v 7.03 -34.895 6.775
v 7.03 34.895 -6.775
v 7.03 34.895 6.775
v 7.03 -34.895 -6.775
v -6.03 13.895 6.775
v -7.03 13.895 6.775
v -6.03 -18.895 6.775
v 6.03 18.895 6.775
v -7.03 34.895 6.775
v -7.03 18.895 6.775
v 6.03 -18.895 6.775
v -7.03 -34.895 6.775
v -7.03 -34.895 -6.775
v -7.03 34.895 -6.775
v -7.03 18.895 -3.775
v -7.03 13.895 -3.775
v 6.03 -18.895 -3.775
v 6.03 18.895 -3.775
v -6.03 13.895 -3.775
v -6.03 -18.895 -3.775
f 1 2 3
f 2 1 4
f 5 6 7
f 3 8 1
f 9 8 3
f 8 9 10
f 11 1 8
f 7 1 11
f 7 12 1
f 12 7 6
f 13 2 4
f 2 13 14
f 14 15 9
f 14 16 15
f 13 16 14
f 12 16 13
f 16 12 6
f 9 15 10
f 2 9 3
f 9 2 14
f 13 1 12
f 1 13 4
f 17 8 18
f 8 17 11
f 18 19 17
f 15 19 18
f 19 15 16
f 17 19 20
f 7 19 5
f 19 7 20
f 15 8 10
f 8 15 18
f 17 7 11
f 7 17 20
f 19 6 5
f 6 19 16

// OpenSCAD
$fn = 100;

wHaptuator = 11.96 + 0.1;
dHaptuator = 37.69 + 0.1;
hHaptuator = 11.45 + 0.1;

dHole = 5;

thickness = 2;

module haptuatorBox() {
   color("DimGray")
   difference(){
   cube([wHaptuator + thickness, dHaptuator + thickness + 30, hHaptuator + thickness], center = true);
   
   //Cavity
   translate([0, 0 , thickness]){
   cube([wHaptuator, dHaptuator, hHaptuator], center = true);
   };
   
   //Access for removing the haptuator
   translate([-wHaptuator / 2, dHaptuator / 2 - dHole / 2, thickness]){
   cube([thickness * 1.2, dHole, hHaptuator], center = true);
}
   };
};



haptuatorBox();
